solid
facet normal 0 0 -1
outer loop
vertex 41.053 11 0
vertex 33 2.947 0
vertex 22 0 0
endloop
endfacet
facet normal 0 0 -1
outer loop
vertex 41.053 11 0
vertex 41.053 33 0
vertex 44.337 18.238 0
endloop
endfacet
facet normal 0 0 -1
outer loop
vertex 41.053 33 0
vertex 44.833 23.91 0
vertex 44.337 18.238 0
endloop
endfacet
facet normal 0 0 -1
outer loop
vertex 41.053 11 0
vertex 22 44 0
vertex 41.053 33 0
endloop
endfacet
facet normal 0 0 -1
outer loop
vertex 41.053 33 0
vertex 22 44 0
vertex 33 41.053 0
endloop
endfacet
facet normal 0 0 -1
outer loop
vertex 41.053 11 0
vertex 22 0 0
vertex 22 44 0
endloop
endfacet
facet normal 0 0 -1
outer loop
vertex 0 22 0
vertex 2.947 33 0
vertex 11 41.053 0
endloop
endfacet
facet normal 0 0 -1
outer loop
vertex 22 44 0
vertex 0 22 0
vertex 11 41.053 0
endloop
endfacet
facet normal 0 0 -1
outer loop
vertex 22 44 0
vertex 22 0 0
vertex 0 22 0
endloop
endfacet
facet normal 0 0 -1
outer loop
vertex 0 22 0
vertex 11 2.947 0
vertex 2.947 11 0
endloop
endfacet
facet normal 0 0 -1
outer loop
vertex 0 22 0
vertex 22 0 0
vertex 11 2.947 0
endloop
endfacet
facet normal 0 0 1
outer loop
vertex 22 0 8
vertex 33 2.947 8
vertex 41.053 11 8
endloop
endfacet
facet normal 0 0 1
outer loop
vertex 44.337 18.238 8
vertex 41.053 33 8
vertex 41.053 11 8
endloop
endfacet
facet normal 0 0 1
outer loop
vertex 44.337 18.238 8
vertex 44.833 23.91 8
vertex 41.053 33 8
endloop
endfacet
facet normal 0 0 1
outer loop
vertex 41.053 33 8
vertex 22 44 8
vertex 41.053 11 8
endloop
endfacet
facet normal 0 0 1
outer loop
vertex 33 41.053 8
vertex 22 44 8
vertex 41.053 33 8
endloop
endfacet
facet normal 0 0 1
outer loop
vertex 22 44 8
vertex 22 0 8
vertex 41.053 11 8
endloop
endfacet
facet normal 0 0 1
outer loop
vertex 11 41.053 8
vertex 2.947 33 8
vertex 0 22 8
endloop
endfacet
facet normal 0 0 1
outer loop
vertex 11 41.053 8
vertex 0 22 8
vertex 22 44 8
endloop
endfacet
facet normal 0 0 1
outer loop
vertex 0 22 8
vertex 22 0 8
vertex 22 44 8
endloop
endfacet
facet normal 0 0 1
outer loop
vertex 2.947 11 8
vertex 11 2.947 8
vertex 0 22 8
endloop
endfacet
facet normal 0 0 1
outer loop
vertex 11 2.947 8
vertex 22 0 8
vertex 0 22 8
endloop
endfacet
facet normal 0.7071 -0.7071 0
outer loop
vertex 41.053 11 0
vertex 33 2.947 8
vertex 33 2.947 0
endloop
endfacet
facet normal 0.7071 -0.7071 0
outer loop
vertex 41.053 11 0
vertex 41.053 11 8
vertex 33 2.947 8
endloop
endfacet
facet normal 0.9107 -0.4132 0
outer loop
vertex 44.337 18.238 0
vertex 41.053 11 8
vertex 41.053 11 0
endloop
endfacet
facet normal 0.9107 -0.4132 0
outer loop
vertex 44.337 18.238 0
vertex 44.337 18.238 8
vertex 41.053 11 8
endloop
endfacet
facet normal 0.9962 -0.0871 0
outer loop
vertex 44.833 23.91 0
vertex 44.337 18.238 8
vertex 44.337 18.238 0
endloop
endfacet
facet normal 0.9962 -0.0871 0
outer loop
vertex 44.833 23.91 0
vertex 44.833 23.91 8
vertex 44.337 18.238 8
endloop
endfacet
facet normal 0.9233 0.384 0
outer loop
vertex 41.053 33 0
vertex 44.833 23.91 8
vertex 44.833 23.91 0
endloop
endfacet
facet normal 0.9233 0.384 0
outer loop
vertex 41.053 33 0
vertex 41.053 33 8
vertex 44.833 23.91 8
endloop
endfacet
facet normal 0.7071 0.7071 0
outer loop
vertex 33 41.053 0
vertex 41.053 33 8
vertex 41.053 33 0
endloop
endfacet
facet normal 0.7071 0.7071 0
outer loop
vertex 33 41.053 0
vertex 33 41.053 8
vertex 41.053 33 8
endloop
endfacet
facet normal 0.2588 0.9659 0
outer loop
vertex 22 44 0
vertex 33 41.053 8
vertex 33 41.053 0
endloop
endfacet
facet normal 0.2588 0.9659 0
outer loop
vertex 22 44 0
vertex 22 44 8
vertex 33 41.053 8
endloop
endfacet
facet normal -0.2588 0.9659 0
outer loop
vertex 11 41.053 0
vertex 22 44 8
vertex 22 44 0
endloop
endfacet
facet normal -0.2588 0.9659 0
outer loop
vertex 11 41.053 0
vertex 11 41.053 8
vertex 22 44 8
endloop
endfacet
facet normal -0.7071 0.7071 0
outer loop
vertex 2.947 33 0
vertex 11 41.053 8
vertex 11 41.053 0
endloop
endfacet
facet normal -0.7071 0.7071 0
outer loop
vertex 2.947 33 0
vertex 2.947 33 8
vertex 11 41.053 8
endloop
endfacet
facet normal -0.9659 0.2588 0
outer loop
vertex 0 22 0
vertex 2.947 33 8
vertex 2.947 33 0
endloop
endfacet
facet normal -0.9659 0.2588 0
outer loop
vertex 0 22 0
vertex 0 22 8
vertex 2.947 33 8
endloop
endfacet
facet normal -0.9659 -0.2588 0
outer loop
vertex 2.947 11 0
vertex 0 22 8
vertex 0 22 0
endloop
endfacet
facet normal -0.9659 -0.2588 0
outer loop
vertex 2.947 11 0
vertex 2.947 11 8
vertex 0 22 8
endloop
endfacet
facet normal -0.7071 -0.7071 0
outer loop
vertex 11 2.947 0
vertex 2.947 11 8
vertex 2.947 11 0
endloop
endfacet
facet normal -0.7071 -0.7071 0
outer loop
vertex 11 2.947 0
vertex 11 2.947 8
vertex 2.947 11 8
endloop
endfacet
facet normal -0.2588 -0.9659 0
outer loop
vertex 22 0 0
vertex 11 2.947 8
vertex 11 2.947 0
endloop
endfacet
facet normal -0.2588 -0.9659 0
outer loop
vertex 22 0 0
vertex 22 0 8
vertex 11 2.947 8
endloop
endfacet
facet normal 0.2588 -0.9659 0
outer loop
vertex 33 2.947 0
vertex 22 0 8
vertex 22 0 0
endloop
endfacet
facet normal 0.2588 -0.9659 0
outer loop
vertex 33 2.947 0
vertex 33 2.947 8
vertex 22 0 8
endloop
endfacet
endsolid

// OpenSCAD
$fn = 32;

// ----------------------------------------------------------------------
// Eccentric disc: step, 8 mm thick
// ----------------------------------------------------------------------

// --- parameters (mm) ---
profile_height = 8;       // extrusion height
profile_points = 13;      // points of the closed outline

profile = [[0, 22], [2.947, 11], [11, 2.947], [22, 0], [33, 2.947], [41.053, 11], [44.337, 18.238], [44.833, 23.91], [41.053, 33], [33, 41.053], [22, 44], [11, 41.053], [2.947, 33]];  // single closed polygon, 13 points, counter clockwise

// --- the one profile operation ---
linear_extrude(height = profile_height) polygon(points = profile);
